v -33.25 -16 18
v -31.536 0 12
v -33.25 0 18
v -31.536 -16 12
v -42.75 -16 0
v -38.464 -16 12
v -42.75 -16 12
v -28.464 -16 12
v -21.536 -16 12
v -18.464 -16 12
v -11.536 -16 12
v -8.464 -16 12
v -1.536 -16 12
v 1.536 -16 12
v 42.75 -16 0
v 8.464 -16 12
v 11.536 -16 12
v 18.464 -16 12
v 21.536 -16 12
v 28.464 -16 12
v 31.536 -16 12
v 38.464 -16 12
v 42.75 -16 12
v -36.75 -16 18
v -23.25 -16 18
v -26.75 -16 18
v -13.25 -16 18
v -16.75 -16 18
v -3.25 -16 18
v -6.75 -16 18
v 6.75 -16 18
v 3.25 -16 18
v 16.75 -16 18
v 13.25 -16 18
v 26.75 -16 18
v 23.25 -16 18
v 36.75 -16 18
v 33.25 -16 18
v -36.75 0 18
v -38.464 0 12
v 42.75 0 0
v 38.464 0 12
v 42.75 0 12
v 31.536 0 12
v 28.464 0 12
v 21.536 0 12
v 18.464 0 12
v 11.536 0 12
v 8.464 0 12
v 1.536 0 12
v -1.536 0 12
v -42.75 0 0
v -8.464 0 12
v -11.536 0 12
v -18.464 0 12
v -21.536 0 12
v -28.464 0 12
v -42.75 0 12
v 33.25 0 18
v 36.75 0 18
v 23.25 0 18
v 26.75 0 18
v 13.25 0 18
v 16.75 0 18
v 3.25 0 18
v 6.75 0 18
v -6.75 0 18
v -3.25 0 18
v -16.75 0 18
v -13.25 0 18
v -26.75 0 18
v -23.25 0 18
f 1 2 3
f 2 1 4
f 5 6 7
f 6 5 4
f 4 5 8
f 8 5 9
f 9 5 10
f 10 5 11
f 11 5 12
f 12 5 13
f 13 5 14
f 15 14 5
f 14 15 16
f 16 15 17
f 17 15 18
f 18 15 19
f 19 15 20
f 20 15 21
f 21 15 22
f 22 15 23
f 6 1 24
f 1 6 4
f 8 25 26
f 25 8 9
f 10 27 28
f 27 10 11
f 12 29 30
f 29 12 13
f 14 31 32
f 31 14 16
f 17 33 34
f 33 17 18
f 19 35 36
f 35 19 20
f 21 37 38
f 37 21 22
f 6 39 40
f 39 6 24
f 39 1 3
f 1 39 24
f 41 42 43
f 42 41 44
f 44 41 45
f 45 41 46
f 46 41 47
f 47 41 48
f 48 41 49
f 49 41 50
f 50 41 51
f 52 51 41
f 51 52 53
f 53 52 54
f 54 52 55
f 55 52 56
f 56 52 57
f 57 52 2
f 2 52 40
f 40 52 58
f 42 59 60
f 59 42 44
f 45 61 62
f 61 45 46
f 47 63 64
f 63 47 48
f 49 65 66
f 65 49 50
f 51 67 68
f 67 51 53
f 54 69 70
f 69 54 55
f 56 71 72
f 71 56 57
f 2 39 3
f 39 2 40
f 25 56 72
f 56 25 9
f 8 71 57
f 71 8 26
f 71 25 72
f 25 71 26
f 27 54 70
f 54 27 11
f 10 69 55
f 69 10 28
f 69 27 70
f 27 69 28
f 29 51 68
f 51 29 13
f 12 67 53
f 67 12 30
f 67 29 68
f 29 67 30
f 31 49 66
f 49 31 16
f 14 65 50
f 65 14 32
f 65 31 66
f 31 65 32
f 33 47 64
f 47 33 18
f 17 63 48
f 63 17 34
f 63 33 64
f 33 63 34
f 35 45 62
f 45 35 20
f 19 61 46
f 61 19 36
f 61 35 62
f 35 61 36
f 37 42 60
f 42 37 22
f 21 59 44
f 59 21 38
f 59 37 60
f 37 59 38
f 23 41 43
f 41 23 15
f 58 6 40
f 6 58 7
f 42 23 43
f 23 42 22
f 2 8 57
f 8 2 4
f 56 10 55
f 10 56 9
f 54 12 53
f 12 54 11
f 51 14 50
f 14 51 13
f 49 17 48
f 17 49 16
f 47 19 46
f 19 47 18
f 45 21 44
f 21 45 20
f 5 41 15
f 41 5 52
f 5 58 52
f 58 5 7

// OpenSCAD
$fn = 32;

// ----------------------------------------------------------------------
// Toothed rack, 8 teeth
// 10 mm pitch, 6 mm teeth
// ----------------------------------------------------------------------

// --- parameters (mm) ---
bar_w = 16;     // bar width (Y)
bar_h = 12;     // bar height (Z)
teeth = 8;      // number of teeth
pitch = 10;     // tooth pitch
tooth_h = 6;    // tooth height above the bar
root_w = 7.5;   // tooth width at the root
crest_w = 3.5;  // tooth width at the crest

// --- derived feature positions (mm) ---
span = (teeth - 1) * pitch;  // = 70   distance between the outer teeth
bar_l = span + root_w + 8;   // = 85.5   bar length: teeth plus 4 mm at each end
tooth_x = -span / 2;         // = -35   X of the first tooth
height = bar_h + tooth_h;    // = 18   overall height
feature_centers = [
  [tooth_x + 0 * pitch, -bar_w / 2],
  [tooth_x + 1 * pitch, -bar_w / 2],
  [tooth_x + 2 * pitch, -bar_w / 2],
  [tooth_x + 3 * pitch, -bar_w / 2],
  [tooth_x + 4 * pitch, -bar_w / 2],
  [tooth_x + 5 * pitch, -bar_w / 2],
  [tooth_x + 6 * pitch, -bar_w / 2],
  [tooth_x + 7 * pitch, -bar_w / 2]
];   // tooth centre line, drives the tooth loop

// bar with a rack of teeth, one extruded trapezoium per centre
module rack_tooth() {
  linear_extrude(height = bar_w)
    polygon(points = [
      [0, 0],
      [root_w, 0],
      [root_w / 2 + crest_w / 2, tooth_h + 1],
      [root_w / 2 - crest_w / 2, tooth_h + 1]
    ]);
}

union() {
  translate([-bar_l / 2, -bar_w, 0]) cube([bar_l, bar_w, bar_h]);
  for (centre = feature_centers)
    translate([centre[0] - root_w / 2, 0, bar_h - 1]) rotate([90, 0, 0]) rack_tooth();
}
